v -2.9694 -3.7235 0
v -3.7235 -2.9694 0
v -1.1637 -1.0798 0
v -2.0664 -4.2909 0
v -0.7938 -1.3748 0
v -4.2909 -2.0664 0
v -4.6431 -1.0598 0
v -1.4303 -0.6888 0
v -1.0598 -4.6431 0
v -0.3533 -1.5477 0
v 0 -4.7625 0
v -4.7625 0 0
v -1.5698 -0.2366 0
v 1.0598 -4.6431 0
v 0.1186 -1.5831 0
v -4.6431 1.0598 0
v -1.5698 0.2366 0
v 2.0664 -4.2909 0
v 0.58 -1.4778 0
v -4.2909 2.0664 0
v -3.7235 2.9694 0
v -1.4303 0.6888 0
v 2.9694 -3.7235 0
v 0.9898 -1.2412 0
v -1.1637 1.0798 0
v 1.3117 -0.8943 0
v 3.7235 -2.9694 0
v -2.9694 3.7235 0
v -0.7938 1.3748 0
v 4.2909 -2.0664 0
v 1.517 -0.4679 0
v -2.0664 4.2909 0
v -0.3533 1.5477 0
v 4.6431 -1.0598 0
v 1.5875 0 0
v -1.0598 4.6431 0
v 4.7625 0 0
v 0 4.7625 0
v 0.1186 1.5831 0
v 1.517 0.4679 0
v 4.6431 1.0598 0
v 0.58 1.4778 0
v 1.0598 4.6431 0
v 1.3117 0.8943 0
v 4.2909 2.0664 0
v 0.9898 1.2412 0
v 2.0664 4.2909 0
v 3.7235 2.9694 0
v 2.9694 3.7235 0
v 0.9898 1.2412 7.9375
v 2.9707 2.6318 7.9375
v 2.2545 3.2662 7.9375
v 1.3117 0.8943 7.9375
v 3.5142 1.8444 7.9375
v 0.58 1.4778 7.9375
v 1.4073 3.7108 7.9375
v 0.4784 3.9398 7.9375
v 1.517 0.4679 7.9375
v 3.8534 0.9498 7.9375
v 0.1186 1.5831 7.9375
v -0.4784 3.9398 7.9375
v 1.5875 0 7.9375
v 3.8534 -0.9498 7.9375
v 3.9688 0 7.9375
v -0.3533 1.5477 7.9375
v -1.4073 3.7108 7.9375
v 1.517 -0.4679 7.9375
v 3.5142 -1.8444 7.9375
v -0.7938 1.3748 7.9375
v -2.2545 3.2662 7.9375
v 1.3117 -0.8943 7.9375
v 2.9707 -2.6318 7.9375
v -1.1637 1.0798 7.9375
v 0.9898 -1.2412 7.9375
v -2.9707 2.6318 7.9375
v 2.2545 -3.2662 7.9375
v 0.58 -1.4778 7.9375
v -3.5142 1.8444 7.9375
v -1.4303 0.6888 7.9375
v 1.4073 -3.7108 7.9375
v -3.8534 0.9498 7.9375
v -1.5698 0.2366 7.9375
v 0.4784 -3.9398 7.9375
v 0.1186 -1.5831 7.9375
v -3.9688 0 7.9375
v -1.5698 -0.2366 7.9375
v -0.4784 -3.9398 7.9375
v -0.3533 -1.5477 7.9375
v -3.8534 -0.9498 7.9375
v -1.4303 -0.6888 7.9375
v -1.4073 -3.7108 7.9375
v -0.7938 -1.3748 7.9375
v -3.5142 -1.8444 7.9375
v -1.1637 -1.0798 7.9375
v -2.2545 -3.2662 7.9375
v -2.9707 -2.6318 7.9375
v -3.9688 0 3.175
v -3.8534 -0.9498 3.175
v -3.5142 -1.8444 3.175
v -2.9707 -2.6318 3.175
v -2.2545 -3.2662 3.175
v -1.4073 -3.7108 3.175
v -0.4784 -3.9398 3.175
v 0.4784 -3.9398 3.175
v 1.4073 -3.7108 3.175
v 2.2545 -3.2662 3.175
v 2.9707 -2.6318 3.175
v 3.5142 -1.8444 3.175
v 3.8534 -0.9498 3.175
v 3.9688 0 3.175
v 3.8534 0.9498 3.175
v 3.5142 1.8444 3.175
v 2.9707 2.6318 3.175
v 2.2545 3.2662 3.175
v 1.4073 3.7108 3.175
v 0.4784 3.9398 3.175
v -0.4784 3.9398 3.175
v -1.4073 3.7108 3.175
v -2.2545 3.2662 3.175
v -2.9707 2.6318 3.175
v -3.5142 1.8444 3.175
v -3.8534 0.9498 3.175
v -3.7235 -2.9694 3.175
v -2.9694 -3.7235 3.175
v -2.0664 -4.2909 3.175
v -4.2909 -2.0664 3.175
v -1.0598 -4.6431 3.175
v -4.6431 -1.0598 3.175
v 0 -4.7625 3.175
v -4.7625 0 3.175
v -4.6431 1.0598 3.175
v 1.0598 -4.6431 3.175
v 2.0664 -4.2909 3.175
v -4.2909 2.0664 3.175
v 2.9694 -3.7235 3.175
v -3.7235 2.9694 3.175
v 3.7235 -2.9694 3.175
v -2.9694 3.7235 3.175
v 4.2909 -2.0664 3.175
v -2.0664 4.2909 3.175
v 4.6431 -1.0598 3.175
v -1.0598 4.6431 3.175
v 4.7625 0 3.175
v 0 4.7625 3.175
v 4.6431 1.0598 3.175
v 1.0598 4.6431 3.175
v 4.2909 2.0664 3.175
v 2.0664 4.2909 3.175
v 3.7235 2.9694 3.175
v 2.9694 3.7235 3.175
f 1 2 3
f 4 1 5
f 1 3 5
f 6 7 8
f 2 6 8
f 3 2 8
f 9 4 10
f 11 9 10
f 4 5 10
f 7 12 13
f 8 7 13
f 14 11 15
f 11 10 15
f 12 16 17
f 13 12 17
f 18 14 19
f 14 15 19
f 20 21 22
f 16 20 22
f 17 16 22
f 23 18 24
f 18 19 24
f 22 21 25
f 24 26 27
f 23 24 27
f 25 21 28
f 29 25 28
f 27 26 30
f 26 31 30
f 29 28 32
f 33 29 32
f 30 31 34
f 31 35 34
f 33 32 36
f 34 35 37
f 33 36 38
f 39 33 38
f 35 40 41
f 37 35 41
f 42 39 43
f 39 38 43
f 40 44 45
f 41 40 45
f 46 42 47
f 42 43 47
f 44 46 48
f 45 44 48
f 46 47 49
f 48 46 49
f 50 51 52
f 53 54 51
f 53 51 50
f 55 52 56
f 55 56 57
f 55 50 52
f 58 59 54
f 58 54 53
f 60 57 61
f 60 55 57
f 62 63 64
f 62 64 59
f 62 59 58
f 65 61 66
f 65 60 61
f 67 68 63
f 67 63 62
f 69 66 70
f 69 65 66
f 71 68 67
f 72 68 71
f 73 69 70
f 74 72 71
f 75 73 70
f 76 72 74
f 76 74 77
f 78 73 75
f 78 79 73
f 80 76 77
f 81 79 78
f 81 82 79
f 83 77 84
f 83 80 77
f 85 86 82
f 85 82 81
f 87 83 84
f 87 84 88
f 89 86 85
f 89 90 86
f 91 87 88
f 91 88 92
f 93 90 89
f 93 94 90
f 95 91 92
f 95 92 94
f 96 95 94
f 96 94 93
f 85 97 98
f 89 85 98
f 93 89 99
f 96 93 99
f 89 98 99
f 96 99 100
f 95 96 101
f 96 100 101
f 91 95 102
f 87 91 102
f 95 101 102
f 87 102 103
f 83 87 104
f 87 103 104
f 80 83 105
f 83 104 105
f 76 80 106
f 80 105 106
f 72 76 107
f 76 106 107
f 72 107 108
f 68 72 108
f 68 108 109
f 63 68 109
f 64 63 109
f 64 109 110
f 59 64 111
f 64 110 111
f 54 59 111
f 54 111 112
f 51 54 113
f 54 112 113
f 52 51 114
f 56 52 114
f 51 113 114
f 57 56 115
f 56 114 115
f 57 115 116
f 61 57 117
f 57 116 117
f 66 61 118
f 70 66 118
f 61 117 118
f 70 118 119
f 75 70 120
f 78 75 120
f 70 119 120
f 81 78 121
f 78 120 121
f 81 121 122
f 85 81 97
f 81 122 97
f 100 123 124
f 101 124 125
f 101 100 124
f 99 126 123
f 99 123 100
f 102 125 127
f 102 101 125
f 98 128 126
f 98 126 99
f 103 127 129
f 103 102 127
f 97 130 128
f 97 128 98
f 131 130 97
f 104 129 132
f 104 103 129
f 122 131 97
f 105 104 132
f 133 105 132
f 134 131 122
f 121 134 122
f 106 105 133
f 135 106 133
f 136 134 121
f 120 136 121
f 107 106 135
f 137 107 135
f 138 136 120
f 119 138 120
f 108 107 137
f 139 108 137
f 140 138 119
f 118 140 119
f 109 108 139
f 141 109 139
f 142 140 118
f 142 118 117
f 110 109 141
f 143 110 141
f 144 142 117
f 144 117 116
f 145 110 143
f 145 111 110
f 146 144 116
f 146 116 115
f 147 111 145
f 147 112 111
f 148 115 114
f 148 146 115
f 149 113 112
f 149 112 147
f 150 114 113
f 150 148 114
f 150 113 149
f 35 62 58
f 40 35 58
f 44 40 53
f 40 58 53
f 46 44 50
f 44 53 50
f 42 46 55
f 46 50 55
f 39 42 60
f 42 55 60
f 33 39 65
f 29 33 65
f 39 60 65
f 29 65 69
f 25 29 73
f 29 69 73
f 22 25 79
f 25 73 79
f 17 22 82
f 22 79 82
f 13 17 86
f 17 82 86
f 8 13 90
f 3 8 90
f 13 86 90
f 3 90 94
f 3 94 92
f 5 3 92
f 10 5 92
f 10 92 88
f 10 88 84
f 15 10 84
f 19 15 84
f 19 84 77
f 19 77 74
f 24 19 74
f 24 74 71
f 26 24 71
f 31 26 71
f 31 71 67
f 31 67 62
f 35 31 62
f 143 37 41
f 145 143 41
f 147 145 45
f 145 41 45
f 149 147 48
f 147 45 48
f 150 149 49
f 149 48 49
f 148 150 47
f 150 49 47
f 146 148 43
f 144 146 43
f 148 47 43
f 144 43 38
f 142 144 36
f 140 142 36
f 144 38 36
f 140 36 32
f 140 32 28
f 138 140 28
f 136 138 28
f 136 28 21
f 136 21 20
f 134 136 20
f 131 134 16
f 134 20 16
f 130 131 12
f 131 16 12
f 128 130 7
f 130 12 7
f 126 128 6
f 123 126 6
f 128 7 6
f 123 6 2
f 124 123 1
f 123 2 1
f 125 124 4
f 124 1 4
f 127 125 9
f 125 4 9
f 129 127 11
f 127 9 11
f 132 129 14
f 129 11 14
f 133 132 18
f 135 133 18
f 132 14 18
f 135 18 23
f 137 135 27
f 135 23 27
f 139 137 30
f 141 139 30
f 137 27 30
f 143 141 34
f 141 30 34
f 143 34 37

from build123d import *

# Parameters (mm, degrees)
SKETCH1_R           = 4.7625
BOSS_EXTRUDE1_DEPTH = 3.175
SKETCH2_R           = 3.96875
BOSS_EXTRUDE2_DEPTH = 4.7625
SKETCH3_R           = 1.5875
CUT_EXTRUDE1_DEPTH  = 11.409933657


with BuildPart() as part:
    # Sketch1 → Boss-Extrude1 (new body)
    with BuildSketch(Plane.XY):
        Circle(SKETCH1_R)
    extrude(amount=BOSS_EXTRUDE1_DEPTH)

    # Sketch2 → Boss-Extrude2 (add)
    with BuildSketch(Plane.XY.offset(3.175)):
        with Locations(Location((0, 0, 0), (0, 0, 180))):
            Circle(SKETCH2_R)
    extrude(amount=BOSS_EXTRUDE2_DEPTH)

    # Sketch3 → Cut-Extrude1 (cut, through all)
    with BuildSketch(Plane.XY.offset(7.9375)):
        Circle(SKETCH3_R)
    extrude(amount=-CUT_EXTRUDE1_DEPTH, mode=Mode.SUBTRACT)


solid = part.part
